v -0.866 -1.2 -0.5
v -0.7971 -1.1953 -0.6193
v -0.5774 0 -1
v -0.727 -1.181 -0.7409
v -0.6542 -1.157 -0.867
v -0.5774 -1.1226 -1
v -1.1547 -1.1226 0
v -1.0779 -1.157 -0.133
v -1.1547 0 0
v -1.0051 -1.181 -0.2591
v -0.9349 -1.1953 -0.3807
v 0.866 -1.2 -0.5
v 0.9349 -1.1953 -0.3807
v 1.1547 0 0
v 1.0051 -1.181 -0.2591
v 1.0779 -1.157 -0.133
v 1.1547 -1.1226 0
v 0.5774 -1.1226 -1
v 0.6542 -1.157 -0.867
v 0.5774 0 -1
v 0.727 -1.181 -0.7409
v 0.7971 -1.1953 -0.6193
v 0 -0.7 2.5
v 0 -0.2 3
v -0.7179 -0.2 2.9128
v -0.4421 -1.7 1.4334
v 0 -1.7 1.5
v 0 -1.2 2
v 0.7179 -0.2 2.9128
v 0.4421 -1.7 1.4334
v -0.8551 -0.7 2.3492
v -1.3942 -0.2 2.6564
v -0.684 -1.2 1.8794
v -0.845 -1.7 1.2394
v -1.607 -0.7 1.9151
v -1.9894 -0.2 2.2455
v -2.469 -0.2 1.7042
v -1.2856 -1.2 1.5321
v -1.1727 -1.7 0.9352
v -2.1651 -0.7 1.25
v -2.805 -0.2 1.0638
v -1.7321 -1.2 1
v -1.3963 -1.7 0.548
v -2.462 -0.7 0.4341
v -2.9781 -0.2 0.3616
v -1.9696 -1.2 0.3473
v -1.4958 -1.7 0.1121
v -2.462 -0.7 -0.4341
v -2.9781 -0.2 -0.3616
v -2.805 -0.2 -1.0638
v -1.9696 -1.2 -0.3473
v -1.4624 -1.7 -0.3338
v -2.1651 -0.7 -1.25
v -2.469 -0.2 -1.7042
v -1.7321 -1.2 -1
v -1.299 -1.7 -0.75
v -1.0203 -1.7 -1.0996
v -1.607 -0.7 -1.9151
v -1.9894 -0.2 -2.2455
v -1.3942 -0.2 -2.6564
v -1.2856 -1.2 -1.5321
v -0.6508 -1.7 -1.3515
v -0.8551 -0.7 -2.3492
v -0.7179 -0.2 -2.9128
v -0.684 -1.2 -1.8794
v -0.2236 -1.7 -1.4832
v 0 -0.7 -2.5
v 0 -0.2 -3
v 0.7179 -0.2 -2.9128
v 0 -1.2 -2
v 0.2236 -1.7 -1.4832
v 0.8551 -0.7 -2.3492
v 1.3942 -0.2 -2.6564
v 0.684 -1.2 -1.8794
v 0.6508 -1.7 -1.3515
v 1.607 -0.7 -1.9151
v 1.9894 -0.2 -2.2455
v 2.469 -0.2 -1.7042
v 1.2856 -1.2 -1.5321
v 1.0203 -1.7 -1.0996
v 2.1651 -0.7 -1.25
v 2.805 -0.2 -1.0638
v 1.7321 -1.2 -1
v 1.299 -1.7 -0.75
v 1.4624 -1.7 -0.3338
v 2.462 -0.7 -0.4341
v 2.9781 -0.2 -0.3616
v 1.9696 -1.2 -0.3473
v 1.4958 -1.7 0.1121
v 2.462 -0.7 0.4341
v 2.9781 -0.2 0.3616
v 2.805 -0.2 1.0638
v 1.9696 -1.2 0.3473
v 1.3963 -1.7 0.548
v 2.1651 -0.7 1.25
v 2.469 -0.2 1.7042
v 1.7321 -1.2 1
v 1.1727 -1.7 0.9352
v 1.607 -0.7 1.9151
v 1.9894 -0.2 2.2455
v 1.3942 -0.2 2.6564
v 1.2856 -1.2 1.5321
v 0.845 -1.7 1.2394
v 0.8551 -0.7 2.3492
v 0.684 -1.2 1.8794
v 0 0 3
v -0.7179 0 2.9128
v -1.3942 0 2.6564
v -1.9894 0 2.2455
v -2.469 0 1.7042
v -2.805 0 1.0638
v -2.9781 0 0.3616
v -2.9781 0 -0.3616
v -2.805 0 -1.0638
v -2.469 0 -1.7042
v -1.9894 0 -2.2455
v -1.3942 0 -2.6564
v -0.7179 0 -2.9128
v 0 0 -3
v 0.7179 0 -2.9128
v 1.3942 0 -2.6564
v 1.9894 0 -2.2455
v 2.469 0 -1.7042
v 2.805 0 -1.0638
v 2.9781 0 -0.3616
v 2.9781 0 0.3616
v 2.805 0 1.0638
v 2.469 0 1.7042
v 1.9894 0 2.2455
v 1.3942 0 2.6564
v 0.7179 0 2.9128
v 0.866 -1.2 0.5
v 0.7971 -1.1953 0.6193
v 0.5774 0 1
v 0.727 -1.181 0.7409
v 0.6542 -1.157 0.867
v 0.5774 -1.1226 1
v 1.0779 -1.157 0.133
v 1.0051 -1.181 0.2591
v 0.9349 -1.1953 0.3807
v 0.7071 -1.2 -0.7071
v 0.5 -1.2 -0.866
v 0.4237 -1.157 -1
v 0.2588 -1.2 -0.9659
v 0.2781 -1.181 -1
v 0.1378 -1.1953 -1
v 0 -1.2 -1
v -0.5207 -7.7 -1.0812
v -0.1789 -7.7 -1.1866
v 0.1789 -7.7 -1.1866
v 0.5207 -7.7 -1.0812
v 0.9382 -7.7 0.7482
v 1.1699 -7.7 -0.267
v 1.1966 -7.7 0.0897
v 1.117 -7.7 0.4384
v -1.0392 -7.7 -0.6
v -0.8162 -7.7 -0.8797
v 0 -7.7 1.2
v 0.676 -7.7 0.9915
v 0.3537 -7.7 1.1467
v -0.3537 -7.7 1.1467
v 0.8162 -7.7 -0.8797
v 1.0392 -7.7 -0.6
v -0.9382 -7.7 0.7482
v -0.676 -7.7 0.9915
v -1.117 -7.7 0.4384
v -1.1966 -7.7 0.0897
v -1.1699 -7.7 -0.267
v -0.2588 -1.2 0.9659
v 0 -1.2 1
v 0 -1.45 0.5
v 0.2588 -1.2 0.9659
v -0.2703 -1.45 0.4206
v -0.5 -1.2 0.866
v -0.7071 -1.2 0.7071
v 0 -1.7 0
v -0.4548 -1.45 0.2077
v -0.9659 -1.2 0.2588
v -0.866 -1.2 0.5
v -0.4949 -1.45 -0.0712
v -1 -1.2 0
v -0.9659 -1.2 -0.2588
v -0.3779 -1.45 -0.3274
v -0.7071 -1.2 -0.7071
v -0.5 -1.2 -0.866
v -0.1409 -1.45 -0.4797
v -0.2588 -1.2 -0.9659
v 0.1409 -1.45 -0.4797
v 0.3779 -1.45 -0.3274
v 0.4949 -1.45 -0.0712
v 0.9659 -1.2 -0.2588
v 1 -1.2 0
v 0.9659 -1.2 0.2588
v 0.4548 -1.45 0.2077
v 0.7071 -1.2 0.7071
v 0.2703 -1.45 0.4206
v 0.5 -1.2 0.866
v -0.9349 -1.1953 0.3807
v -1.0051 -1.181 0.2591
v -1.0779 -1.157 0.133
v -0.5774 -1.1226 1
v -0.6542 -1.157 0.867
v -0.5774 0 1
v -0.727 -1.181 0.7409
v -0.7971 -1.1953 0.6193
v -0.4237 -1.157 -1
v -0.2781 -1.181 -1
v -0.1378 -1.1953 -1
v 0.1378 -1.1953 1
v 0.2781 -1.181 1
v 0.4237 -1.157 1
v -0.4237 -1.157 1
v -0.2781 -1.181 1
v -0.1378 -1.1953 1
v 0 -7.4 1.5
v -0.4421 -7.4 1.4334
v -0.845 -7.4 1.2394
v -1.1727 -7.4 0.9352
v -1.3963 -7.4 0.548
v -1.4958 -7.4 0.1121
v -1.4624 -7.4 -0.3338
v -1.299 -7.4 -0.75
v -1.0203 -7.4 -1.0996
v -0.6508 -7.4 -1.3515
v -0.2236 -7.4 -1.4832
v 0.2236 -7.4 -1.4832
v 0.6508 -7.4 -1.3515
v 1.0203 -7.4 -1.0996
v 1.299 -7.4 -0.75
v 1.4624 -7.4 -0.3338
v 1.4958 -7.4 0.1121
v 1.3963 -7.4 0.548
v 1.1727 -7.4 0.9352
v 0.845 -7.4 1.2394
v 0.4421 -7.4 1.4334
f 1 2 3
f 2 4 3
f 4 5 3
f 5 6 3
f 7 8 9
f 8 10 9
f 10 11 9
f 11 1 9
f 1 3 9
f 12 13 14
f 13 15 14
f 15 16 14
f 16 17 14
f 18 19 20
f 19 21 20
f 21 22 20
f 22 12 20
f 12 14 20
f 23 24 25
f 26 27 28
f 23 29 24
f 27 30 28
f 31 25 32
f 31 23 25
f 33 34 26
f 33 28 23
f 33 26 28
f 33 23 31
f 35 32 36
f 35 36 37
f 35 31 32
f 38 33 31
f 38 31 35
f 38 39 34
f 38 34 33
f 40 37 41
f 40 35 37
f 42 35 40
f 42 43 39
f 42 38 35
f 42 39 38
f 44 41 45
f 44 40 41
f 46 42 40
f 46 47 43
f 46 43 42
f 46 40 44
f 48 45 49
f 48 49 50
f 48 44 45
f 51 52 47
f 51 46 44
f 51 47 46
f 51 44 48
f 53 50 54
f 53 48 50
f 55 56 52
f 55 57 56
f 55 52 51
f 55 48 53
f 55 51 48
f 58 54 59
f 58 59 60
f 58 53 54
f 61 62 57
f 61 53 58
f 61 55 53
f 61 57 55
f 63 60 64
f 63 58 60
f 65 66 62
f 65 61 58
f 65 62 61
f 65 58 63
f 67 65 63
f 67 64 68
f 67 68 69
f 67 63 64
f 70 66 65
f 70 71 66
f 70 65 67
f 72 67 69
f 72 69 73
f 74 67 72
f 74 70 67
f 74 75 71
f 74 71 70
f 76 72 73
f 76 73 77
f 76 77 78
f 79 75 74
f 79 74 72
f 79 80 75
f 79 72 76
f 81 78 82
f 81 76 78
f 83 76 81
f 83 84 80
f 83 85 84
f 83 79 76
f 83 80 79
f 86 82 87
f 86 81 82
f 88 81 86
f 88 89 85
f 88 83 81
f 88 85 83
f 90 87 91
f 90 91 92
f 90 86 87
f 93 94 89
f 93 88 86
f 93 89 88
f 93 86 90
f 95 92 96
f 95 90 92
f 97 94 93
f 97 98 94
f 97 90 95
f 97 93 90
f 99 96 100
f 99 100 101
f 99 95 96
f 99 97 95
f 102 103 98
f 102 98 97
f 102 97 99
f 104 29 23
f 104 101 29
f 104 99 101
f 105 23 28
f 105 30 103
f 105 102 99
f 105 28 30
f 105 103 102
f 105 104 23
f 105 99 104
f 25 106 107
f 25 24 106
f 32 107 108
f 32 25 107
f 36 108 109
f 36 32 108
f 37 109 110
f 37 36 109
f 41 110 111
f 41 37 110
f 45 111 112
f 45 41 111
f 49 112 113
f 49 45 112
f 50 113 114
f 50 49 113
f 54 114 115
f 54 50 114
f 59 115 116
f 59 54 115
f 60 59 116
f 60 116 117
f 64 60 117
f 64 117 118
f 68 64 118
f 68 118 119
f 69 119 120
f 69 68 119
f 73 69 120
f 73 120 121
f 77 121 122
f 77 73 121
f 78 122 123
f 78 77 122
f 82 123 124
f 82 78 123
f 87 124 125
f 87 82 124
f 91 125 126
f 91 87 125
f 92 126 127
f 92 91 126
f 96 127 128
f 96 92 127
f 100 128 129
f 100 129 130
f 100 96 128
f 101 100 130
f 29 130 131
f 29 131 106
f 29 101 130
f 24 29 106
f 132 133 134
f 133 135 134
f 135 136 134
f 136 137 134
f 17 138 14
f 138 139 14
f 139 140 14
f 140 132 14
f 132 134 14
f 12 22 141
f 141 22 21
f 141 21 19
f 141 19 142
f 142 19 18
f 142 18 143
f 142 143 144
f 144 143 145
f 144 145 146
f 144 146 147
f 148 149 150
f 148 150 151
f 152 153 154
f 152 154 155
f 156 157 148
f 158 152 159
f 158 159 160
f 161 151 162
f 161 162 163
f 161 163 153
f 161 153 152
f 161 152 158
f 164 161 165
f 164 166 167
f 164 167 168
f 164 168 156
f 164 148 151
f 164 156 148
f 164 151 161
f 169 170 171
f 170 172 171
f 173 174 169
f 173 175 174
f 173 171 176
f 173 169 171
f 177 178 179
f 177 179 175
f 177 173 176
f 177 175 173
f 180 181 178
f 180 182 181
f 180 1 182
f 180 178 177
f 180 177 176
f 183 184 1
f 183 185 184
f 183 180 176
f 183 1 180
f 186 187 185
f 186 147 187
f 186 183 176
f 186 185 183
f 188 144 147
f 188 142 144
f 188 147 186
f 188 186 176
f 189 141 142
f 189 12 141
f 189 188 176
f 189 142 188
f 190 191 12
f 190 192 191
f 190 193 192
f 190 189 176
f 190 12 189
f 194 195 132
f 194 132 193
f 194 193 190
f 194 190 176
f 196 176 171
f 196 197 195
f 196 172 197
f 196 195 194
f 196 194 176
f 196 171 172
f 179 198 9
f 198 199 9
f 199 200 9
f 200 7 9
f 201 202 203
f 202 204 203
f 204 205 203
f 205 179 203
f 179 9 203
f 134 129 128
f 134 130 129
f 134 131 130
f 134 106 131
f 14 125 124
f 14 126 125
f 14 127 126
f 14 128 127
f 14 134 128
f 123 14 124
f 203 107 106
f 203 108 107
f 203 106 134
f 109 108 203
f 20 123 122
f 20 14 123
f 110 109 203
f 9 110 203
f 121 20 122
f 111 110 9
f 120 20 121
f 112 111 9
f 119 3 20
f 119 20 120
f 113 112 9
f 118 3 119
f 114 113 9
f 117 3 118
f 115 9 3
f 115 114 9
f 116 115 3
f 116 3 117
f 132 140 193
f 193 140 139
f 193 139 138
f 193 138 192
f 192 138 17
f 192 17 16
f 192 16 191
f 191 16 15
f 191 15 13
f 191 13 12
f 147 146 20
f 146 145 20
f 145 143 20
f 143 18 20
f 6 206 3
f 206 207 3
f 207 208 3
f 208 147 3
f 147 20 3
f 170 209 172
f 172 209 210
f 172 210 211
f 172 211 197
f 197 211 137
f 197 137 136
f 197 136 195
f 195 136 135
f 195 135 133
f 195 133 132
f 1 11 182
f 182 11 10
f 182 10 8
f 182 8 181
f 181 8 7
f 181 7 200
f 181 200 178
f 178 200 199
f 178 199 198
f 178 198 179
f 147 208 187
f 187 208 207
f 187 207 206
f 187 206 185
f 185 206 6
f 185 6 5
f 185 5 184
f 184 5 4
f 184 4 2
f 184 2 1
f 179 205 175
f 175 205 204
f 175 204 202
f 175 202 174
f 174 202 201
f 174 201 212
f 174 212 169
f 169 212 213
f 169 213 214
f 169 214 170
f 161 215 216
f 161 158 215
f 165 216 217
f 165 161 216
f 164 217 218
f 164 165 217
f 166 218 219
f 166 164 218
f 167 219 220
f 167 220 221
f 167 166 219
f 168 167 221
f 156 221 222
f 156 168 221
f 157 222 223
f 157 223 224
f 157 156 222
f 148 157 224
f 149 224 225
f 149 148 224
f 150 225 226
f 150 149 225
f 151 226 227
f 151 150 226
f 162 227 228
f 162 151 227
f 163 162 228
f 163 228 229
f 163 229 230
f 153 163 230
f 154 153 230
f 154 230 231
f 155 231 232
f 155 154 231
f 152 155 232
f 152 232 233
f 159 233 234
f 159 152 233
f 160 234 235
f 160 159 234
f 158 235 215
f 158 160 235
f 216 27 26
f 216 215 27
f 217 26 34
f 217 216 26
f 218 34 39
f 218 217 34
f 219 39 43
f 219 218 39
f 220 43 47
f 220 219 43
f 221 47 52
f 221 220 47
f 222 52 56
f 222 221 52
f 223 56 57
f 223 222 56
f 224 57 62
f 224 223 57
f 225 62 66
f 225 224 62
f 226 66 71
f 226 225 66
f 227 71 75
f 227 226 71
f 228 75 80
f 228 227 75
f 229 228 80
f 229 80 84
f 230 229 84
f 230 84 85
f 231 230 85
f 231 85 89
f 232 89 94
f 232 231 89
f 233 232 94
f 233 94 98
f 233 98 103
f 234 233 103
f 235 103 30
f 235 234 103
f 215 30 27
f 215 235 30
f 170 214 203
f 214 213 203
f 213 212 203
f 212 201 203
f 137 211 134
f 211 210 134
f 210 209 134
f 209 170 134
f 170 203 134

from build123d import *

# Parameters (mm, degrees)
CUT_EXTRUDE2_REACH = 10.791


with BuildPart() as part:
    # Sketch1 → Revolve1 (revolve)
    with BuildSketch(Plane.XY, mode=Mode.PRIVATE) as revolve1_sk:
        Polygon((-1.5, -1.7), (-1.5, -7.4), (-1.2, -7.7), (0, -7.7), (0, -1.7), (-1, -1.2), (-1, 0), (-3, 0), (-3, -0.2), align=None)
    revolve(revolve1_sk.sketch.rotate(Axis((0, 2.75, 0), (0, -1, 0)), 270), axis=Axis((0, 2.75, 0), (0, -1, 0)))

    # Cut-Extrude2: up to this cone (the profile starts inside it)
    cut_extrude2_end = Plane(origin=(0, 0, 0), z_dir=(0, 1, 0)).offset(-1.699999) * Cone(2e-06, 32.782, 16.390999, align=(Align.CENTER, Align.CENTER, Align.MIN), mode=Mode.PRIVATE)
    # Sketch3 → Cut-Extrude2 (cut, up to the surface)
    with BuildSketch(Plane(origin=(0, 0, 0), x_dir=(1, 0, 0), z_dir=(0, 1, 0)), mode=Mode.PRIVATE) as cut_extrude2_sk1:
        Polygon((-0.577350269, -1), (0.577350269, -1), (1.154700538, 0), (0.577350269, 1), (-0.577350269, 1), (-1.154700538, 0), align=None)
    cut_extrude2_tool1 = extrude(cut_extrude2_sk1.sketch, amount=-CUT_EXTRUDE2_REACH, mode=Mode.PRIVATE) & cut_extrude2_end
    add(cut_extrude2_tool1.solids().sort_by_distance((0, 0, 0))[0], mode=Mode.SUBTRACT)


solid = part.part
